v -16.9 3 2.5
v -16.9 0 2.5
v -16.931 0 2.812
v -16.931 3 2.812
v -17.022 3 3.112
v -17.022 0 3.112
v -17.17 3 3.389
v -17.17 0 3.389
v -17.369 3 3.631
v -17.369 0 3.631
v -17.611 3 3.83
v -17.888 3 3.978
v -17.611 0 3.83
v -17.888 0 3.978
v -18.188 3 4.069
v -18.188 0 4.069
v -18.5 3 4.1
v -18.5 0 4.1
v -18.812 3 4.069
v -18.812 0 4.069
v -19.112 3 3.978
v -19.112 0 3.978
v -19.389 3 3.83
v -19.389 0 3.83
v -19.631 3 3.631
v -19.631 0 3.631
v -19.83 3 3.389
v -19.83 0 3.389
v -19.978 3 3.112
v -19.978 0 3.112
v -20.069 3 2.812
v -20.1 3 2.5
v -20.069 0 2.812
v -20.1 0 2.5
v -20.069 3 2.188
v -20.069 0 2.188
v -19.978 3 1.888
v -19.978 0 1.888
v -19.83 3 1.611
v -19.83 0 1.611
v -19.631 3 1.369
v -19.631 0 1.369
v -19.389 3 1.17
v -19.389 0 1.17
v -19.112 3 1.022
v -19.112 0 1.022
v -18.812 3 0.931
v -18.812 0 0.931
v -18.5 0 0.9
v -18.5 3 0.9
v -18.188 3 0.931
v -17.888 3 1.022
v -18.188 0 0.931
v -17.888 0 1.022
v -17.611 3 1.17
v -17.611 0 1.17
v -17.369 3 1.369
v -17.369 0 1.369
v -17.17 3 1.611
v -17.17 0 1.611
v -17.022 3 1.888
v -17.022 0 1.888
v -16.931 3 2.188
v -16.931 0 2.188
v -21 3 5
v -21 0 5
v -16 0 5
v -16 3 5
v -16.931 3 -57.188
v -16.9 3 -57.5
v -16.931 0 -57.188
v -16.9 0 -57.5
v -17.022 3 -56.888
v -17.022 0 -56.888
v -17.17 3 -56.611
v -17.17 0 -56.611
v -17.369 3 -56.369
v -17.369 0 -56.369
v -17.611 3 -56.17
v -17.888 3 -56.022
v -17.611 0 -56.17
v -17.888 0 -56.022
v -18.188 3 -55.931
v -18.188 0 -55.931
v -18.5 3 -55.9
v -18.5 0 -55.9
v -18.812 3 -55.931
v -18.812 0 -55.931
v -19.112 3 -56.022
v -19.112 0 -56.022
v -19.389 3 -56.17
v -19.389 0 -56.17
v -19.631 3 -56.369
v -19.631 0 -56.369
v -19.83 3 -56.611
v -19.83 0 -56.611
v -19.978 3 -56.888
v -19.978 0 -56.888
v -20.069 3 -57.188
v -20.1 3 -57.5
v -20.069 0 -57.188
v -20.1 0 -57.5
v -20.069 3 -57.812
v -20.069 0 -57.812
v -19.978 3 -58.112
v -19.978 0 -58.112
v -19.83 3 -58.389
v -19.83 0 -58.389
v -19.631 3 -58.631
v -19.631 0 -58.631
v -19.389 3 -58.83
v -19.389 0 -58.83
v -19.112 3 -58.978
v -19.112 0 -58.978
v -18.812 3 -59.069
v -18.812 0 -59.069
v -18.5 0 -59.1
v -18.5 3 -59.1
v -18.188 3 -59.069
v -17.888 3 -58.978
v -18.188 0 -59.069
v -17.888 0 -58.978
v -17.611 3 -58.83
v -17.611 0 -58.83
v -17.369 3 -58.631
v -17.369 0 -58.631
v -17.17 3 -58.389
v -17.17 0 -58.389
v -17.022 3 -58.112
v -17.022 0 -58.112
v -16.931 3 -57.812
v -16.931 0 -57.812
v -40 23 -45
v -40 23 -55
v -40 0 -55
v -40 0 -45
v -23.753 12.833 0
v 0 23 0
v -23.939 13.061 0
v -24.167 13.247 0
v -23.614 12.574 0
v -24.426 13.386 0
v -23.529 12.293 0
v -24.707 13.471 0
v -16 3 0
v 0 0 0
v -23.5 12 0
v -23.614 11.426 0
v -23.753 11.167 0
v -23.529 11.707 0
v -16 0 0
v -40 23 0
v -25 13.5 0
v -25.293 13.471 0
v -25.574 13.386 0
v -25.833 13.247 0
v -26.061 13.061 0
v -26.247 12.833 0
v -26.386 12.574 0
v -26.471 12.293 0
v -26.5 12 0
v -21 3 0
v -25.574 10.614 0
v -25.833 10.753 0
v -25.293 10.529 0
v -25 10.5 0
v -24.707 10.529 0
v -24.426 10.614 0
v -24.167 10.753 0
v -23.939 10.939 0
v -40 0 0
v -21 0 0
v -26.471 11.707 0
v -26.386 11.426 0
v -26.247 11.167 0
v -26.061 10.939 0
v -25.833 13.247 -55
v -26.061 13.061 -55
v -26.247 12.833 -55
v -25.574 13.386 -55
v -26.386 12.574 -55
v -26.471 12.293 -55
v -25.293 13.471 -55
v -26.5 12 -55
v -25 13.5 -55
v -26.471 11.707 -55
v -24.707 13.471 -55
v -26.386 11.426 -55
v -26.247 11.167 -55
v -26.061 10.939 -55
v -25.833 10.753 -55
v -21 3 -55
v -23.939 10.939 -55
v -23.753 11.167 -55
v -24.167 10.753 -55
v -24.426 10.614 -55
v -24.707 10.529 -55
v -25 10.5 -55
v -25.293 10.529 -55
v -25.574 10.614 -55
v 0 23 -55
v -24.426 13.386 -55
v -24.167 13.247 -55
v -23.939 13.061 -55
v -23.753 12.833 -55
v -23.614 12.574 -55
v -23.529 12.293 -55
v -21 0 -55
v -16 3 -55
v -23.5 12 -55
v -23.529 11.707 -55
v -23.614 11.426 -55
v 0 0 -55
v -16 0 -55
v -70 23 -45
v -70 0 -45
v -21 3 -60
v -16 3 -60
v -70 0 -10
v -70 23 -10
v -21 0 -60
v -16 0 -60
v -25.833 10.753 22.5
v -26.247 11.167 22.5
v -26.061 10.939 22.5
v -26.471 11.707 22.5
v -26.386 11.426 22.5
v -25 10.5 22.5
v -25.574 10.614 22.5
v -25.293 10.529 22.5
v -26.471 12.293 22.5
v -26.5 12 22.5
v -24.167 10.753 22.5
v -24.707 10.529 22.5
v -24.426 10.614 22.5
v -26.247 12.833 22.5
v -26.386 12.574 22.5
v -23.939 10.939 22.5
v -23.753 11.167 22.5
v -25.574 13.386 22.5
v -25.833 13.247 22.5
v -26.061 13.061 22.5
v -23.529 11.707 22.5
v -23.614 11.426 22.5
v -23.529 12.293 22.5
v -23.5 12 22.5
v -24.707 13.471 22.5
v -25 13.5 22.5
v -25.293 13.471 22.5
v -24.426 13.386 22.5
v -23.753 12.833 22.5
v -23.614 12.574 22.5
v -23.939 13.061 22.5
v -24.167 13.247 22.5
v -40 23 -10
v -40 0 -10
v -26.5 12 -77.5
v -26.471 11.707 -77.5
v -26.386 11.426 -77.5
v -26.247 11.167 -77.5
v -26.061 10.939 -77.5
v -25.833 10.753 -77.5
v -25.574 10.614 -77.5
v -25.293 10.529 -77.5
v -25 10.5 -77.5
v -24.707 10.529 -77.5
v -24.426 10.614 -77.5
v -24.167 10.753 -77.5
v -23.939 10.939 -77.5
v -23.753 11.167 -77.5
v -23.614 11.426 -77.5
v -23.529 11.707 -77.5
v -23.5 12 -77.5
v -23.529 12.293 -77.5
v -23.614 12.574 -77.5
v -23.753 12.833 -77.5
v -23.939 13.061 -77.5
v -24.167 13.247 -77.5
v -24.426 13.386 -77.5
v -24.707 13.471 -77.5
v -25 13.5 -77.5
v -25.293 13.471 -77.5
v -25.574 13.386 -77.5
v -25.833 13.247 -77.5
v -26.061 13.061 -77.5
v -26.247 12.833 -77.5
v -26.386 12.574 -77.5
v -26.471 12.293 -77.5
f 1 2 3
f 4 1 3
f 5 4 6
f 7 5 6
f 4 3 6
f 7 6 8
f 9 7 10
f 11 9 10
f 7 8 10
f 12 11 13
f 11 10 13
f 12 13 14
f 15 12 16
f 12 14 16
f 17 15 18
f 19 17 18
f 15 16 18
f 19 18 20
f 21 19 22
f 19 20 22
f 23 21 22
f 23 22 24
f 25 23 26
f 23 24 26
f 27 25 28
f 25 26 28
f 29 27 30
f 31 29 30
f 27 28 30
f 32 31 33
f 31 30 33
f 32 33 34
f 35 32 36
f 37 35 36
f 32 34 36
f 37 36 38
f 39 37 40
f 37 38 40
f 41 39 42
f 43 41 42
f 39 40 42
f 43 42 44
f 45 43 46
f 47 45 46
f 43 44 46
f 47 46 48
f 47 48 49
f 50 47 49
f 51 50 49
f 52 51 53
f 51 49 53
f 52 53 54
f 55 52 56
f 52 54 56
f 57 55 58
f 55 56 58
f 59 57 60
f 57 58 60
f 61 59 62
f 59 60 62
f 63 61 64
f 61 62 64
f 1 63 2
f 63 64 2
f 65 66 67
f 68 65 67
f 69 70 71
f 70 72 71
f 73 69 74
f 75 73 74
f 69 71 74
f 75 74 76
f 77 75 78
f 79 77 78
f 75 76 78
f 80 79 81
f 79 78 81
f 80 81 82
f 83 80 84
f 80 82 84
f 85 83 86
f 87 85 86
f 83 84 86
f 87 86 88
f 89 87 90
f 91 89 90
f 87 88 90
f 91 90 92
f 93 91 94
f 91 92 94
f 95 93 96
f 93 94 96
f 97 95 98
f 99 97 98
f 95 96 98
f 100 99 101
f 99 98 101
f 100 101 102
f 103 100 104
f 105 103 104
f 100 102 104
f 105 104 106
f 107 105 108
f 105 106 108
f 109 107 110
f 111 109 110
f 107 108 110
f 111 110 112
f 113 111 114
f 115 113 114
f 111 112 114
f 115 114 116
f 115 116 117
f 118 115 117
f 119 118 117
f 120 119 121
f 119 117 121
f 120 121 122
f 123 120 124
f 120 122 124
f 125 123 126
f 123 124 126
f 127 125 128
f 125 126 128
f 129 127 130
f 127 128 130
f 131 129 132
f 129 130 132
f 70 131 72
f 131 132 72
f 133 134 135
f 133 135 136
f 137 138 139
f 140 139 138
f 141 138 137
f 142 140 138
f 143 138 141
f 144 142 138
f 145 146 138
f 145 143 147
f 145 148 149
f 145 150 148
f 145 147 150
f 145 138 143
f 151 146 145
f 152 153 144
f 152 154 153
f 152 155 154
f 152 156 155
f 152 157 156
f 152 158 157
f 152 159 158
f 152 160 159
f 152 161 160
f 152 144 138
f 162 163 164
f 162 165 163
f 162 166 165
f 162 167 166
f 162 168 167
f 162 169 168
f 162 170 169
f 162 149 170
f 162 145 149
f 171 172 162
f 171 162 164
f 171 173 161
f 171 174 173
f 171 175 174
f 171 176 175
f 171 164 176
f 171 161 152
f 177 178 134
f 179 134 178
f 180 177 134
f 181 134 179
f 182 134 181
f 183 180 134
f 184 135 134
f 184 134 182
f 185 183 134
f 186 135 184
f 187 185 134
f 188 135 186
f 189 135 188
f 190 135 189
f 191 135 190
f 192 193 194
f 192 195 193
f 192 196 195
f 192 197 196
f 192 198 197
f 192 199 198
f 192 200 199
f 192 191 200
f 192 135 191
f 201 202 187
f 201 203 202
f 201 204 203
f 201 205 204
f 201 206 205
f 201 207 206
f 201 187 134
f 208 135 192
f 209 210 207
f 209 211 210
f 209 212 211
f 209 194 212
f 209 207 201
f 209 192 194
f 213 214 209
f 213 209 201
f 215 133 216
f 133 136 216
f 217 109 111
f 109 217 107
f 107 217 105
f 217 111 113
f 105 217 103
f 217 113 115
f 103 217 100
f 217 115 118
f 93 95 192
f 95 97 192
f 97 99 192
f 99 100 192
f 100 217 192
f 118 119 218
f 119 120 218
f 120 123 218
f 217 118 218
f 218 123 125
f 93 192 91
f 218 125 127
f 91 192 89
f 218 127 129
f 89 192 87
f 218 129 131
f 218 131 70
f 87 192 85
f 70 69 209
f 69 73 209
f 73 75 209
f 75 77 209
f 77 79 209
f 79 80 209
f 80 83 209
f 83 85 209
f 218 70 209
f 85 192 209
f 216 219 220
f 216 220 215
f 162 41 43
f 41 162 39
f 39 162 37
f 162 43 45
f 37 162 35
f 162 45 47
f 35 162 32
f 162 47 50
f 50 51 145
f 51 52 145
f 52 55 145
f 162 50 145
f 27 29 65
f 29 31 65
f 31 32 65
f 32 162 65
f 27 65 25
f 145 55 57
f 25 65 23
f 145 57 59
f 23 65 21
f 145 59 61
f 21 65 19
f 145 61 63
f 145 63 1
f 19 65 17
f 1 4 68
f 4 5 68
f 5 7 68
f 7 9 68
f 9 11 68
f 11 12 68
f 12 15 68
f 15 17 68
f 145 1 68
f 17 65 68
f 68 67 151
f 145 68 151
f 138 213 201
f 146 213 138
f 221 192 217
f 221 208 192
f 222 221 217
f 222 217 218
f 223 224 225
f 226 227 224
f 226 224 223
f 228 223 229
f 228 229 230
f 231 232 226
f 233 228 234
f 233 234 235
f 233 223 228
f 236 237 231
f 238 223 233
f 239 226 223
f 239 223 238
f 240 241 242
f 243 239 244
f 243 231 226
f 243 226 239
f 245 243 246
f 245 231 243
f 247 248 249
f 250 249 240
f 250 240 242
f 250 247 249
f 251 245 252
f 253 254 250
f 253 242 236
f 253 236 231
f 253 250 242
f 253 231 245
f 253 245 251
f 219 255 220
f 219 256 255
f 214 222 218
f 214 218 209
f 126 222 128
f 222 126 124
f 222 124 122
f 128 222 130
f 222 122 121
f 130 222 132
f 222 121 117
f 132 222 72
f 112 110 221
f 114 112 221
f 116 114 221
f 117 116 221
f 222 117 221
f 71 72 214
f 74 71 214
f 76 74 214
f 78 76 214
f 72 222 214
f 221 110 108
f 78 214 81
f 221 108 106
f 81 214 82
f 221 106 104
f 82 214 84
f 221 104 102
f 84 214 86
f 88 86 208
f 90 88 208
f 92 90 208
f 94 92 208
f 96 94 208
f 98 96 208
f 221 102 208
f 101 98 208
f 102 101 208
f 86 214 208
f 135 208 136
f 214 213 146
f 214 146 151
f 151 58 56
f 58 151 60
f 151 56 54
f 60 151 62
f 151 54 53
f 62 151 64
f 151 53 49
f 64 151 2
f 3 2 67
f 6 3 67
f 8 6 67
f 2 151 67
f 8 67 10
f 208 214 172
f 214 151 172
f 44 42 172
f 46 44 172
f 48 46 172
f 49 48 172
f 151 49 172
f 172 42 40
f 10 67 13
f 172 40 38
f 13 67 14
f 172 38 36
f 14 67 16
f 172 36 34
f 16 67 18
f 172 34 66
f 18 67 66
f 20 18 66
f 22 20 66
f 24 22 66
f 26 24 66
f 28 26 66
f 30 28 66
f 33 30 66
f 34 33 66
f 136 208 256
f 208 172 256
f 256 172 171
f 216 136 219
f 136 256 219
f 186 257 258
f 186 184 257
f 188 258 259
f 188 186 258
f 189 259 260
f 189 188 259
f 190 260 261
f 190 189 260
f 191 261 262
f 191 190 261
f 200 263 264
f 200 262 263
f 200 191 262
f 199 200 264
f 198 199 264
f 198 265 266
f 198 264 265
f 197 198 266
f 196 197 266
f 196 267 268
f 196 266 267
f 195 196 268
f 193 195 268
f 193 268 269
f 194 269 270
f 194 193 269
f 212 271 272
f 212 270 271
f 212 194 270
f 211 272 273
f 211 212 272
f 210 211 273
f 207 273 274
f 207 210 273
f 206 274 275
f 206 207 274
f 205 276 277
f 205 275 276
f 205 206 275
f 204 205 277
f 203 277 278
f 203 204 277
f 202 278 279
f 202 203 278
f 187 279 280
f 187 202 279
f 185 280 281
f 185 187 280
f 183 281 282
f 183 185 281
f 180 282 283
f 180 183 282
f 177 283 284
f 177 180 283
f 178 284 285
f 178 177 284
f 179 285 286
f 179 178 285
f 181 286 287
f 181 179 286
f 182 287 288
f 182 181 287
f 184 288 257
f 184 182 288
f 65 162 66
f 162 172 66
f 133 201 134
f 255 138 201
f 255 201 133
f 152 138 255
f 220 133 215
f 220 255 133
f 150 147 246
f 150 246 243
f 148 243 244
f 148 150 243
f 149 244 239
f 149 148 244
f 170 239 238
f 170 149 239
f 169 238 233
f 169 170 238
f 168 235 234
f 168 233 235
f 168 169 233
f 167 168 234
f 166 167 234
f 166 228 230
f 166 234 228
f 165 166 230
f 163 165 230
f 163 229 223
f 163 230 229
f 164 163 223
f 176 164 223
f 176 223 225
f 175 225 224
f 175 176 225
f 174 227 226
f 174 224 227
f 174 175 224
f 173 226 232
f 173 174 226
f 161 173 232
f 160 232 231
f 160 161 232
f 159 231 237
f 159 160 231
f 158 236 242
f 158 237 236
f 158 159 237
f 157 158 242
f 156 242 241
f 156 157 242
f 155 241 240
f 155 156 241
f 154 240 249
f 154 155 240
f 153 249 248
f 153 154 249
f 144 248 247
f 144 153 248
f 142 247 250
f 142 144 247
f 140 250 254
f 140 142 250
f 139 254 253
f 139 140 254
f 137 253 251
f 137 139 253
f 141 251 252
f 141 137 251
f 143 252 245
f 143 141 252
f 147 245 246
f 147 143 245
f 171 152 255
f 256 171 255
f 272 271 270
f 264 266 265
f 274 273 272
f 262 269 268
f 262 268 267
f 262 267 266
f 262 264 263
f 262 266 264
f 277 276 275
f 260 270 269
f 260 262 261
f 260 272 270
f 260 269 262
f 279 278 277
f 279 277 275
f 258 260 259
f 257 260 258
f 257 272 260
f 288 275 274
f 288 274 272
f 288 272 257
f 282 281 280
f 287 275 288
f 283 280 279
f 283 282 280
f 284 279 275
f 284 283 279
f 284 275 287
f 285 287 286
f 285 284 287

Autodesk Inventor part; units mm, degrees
ref_plane "YZ Plane" through (0, 0, 0) normal (1, 0, 0) x (0, 1, 0)
ref_plane "XZ Plane" through (0, 0, 0) normal (0, 1, 0) x (-1, 0, 0)
ref_plane "XY Plane" through (0, 0, 0) normal (0, 0, 1) x (1, 0, 0)
sketch "スケッチ1" plane through (0, 0, 0) normal (0, 1, 0) x (-1, 0, 0)
  line L0 (0, 0) -> (70, 0)
  line L1 (70, 0) -> (70, -55)
  line L2 (70, -55) -> (0, -55)
  line L3 (0, -55) -> (0, 0)
  line L4 (60, 0) -> (55, 0)
  line L5 (60, -55) -> (55, -55)
  line L6 (70, -55) -> (40, -55)
  line L7 (40, -55) -> (40, -45)
  line L8 (40, -45) -> (70, -45)
  line L9 (70, -45) -> (70, -55)
  line L10 (70, 0) -> (40, 0)
  line L11 (40, 0) -> (40, -10)
  line L12 (40, -10) -> (70, -10)
  line L13 (70, -10) -> (70, 0)
  point P0 (40, 0)
  dimension "d0" = 70
  dimension "d1" = 55
  dimension "d42" = 30
  dimension "d43" = 10
  dimension "d44" = 30
  dimension "d45" = 10
extrude "押し出し1" add sketch "スケッチ1" along normal blind 23 contours L0 L11 L12 L1 L8 L7 L2 L3
sketch "スケッチ2" plane through (0, 0, 0) normal (0, -1, 0) x (1, 0, 0)
  line L0 (-40, 0) -> (0, 0) projected
  line L1 (-16, 0) -> (-21, 0)
  line L2 (-21, 0) -> (-21, 5)
  line L3 (-21, 5) -> (-16, 5)
  line L4 (-16, 5) -> (-16, 0)
  line L5 (0, 0) -> (0, -55) projected
  line L6 (0, -55) -> (-40, -55) projected
  line L7 (-16, -55) -> (-21, -55)
  line L8 (-21, -55) -> (-21, -60)
  line L9 (-21, -60) -> (-16, -60)
  line L10 (-16, -60) -> (-16, -55)
  circle A0 centre (-18.5, 2.5) radius 1.6
  circle A1 centre (-18.5, -57.5) radius 1.6
  point P0 (-70, 0)
  point P1 (-70, -55)
  point P2 (-21, 0)
  dimension "d16" = 5
  dimension "d17" = 5
  dimension "d20" = 16
  dimension "d21" = 5
  dimension "d22" = 5
  dimension "d23" = 16
  dimension "d24" = 3.2
  dimension "d25" = 3.2
  dimension "d26" = 2.5
  dimension "d27" = 2.5
  dimension "d28" = 2.5
  dimension "d29" = 2.5
extrude "押し出し2" add sketch "スケッチ2" against normal blind 3
sketch "スケッチ3" plane through (-70, 23, 0) normal (0, 0, 1) x (1, 0, 0)
  circle A0 centre (45, -11) radius 1.5
  line L0 (70, -23) -> (70, 0) projected
  line L1 (30, -23) -> (49, -23) projected
  point P0 (0, -23)
  dimension "d32" = 3
  dimension "d33" = 25
  dimension "d34" = 12
sketch "スケッチ4" plane through (0, 23, -55) normal (0, 0, -1) x (-1, 0, 0)
  circle A0 centre (25, -11) radius 1.5
  line L0 (0, -23) -> (0, 0) projected
  line L1 (21, -23) -> (16, -23) projected
  point P0 (70, -23)
  dimension "d35" = 3
  dimension "d36" = 25
  dimension "d37" = 12
extrude "押し出し3" add sketch "スケッチ3" along normal blind 22.5
extrude "押し出し4" add sketch "スケッチ4" along normal blind 22.5
properties part number "motor"
